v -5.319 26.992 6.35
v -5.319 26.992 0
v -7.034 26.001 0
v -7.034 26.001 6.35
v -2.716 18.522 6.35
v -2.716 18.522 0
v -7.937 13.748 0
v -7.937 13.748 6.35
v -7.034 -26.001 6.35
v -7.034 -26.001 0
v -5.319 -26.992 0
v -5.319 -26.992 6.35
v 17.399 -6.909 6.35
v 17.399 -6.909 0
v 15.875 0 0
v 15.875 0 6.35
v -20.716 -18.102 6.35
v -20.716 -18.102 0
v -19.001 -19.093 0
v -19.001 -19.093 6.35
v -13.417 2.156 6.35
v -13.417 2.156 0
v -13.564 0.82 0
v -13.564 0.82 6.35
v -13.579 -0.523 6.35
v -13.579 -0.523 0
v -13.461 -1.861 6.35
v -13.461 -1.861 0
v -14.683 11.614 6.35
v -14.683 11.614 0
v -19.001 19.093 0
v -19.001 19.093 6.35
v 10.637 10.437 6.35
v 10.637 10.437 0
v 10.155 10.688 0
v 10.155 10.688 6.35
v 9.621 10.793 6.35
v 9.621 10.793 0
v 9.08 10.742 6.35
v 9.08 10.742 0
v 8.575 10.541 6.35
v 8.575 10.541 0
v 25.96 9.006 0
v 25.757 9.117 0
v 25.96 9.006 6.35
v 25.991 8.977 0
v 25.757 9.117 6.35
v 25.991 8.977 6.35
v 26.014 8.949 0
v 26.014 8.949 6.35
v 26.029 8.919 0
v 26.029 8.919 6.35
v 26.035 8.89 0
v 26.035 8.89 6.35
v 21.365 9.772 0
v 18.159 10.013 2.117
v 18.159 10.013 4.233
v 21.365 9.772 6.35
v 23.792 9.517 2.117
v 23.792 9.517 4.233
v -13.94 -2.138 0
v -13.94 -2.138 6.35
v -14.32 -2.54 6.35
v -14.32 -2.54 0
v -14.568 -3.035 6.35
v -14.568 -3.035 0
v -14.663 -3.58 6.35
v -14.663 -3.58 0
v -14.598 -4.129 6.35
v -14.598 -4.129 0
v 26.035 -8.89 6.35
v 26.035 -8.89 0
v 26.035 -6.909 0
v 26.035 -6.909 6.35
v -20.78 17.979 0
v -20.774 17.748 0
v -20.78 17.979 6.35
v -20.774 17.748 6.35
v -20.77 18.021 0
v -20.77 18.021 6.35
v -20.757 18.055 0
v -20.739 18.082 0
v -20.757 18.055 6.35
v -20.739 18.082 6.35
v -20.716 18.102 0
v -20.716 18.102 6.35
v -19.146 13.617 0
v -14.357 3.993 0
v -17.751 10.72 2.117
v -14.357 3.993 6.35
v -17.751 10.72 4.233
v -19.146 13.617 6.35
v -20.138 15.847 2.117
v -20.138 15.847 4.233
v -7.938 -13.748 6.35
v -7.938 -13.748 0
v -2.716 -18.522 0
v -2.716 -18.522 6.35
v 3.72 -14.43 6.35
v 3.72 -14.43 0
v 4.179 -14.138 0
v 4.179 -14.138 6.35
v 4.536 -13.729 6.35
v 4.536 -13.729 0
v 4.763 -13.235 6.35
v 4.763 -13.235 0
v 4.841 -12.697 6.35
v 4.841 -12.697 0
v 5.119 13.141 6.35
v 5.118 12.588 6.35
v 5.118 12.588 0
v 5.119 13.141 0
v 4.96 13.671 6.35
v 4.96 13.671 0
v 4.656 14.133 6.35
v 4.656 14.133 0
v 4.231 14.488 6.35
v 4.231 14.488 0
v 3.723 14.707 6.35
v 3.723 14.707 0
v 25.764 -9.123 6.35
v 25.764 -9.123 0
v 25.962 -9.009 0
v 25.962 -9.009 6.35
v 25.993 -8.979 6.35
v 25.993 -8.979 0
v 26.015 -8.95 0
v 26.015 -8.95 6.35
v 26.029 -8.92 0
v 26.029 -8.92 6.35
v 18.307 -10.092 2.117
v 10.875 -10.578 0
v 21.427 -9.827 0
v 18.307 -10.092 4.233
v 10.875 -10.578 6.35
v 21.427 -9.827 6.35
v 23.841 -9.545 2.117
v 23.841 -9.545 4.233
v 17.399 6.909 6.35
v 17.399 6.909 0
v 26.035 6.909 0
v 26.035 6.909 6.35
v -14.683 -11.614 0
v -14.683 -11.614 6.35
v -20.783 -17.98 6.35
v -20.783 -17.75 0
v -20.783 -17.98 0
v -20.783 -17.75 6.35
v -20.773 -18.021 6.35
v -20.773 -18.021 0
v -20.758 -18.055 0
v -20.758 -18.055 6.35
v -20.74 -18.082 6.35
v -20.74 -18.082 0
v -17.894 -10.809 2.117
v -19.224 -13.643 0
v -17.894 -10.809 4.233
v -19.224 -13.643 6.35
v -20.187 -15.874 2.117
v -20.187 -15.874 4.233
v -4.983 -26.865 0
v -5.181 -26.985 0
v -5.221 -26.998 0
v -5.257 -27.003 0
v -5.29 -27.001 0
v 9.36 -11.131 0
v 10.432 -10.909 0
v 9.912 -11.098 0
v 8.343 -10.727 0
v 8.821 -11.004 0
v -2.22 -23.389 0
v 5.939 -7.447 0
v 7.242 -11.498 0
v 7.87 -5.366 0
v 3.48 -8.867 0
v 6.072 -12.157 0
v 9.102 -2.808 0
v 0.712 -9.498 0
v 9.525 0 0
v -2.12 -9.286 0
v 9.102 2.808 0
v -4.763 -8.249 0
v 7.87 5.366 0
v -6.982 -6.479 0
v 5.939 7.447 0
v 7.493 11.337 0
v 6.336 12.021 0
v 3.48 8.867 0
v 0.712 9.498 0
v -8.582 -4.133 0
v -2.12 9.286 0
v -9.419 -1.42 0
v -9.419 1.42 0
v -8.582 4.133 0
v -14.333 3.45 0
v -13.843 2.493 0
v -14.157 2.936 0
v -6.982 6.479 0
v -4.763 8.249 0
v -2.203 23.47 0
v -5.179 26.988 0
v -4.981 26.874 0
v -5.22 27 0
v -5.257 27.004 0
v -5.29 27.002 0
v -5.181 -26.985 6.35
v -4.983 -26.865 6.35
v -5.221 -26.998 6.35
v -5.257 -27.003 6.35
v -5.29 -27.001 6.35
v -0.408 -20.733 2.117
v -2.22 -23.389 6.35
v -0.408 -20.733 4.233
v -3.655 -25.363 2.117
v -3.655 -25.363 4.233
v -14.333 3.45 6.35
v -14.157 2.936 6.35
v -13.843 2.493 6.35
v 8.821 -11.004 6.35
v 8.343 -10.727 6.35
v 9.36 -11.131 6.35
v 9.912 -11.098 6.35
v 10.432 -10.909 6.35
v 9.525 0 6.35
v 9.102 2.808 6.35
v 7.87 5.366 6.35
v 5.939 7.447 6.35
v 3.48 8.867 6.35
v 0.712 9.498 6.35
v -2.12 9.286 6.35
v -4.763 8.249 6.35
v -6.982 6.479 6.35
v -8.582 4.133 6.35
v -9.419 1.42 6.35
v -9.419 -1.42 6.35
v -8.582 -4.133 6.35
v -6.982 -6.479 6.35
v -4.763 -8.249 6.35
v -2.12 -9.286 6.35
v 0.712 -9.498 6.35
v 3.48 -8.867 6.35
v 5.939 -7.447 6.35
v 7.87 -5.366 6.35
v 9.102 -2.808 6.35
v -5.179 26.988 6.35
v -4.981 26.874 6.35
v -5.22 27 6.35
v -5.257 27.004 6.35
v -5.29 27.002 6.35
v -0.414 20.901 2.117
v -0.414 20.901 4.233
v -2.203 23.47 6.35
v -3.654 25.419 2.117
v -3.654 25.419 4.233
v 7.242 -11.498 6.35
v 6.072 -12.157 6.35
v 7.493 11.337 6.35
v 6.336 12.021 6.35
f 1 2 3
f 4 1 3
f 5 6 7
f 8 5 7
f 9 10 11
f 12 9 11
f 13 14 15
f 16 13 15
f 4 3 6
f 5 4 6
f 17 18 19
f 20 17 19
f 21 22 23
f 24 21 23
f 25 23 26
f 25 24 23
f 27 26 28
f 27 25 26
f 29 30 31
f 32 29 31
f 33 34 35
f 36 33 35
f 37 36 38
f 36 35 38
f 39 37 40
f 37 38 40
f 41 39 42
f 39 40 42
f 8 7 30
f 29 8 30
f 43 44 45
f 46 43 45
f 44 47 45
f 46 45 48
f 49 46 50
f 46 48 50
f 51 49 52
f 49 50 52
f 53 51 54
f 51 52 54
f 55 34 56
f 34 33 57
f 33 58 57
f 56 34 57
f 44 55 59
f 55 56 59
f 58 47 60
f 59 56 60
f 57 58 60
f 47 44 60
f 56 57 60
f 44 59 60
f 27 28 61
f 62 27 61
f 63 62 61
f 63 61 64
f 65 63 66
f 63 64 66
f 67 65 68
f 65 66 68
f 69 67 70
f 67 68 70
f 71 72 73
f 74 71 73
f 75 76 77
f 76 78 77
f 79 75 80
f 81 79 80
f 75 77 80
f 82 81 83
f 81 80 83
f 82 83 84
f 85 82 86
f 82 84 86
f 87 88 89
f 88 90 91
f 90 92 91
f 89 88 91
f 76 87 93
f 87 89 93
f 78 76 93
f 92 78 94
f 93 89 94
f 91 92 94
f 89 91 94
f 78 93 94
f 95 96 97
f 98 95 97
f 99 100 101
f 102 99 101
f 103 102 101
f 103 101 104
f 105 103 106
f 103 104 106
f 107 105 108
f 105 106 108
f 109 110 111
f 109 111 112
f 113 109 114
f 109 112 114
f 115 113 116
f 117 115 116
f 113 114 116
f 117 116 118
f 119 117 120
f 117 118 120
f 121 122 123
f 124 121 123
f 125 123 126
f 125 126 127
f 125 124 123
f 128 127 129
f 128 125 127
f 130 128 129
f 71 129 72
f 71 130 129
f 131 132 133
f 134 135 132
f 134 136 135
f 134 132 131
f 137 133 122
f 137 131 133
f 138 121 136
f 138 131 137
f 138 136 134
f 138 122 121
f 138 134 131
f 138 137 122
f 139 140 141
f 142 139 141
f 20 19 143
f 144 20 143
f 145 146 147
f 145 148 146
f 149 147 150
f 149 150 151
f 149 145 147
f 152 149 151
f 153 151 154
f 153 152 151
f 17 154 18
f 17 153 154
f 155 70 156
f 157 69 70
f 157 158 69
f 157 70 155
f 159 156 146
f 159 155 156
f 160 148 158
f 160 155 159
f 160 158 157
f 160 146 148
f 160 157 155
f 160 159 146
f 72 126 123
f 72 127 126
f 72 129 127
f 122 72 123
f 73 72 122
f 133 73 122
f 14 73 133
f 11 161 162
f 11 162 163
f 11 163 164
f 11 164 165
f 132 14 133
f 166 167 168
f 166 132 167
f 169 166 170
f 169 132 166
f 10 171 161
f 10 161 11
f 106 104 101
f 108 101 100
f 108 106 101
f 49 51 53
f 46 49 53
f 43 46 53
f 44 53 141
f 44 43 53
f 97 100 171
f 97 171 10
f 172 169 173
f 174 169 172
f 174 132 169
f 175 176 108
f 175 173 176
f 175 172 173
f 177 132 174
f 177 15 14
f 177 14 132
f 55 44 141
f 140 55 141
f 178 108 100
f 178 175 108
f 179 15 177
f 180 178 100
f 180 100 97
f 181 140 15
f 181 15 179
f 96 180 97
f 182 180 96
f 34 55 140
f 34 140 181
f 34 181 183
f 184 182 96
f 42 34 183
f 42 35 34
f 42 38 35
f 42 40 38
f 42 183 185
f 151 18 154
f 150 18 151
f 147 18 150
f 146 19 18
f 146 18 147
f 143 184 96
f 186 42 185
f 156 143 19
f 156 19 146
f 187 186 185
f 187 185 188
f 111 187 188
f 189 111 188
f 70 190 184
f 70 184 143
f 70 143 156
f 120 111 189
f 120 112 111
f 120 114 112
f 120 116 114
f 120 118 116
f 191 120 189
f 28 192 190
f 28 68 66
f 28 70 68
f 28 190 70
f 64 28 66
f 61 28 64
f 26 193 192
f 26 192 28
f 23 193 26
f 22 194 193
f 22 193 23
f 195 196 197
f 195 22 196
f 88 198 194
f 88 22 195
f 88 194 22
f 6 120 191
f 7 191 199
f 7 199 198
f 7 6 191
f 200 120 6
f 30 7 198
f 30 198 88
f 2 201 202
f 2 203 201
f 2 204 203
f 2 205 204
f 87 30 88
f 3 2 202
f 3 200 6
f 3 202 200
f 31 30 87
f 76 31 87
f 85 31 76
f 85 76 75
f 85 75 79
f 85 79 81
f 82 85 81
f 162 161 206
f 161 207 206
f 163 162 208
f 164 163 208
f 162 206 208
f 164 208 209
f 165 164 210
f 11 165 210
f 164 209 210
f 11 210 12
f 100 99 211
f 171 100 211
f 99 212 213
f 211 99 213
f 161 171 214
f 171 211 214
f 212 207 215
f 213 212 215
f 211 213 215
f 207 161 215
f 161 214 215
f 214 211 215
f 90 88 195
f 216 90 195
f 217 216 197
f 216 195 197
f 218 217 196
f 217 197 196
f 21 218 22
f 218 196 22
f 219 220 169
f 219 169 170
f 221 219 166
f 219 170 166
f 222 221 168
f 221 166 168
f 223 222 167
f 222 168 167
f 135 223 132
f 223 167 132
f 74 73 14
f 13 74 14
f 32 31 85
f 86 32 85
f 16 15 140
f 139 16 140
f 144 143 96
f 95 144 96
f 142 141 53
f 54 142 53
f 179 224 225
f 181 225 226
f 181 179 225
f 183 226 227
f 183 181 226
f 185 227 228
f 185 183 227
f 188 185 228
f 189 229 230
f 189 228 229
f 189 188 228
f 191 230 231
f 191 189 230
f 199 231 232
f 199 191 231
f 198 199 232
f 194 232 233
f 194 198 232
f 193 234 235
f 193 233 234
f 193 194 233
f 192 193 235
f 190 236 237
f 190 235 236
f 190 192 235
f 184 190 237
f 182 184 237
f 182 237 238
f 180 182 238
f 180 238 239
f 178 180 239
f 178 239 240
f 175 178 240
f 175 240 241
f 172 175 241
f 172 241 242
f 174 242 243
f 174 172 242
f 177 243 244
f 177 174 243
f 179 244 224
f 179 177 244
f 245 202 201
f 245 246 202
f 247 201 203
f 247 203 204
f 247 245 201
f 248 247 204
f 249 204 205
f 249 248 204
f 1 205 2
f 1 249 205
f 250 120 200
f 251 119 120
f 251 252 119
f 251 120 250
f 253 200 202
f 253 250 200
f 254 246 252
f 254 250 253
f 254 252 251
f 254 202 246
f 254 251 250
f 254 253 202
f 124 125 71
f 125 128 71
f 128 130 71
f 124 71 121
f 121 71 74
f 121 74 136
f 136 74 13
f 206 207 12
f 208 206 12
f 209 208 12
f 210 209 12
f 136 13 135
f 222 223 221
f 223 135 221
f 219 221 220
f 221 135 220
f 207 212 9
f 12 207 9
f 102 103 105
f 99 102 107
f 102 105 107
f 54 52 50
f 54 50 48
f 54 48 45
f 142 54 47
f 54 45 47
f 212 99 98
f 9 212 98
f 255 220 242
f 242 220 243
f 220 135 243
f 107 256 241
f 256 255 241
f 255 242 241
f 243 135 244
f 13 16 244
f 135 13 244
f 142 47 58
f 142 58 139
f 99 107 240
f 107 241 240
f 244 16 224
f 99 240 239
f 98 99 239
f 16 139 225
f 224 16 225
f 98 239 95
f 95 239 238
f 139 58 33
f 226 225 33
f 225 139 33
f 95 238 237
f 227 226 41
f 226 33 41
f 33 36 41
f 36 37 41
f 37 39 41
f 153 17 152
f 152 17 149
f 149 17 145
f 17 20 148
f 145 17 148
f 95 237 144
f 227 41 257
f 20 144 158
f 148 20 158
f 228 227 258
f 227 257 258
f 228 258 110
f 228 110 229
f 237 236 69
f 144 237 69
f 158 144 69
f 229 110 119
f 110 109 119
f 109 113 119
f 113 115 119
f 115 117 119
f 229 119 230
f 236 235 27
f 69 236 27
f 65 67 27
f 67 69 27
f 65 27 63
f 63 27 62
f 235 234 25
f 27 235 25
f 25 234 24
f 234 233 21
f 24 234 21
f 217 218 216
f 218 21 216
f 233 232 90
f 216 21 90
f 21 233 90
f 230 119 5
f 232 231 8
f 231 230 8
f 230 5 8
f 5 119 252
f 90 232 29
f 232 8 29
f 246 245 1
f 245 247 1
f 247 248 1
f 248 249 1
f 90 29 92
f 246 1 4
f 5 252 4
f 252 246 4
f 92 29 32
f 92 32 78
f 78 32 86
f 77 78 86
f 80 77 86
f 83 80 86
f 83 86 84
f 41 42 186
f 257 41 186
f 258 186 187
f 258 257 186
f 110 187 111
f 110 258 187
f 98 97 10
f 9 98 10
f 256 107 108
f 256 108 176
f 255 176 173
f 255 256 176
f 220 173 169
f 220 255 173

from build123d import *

# Parameters (mm, degrees)
F0_R     = 9.525
F1_DEPTH = 6.35
F3_COUNT = 3
F4_R     = 9.525
F5_DEPTH = 6.35
F7_DEPTH = 6.35


with BuildPart() as f1:
    # F0 (on Top) → F1 (new body)
    with BuildSketch(Plane.XY):
        with BuildLine():
            Line((9.525, 0), (12.7, 0))
            ThreePointArc((12.7, 0), (12.1234798492, 3.7830194747), (10.4462619928, 7.2225764363))
            ThreePointArc((10.4462619928, 7.2225764363), (10.00070112, 7.0453500483), (9.525, 6.985))
            Line((9.525, 6.985), (9.525, 0))
        make_face()
        with BuildLine():
            ThreePointArc((9.525, -8.4002604126), (9.9057858228, -7.9476667791), (10.2650859452, -7.4778346155))
            ThreePointArc((10.2650859452, -7.4778346155), (9.9025309799, -7.3659812593), (9.525, -7.3281971973))
            Line((9.525, -7.3281971973), (9.525, -8.4002604126))
        make_face()
        with BuildLine():
            ThreePointArc((11.3988304843, -8.89), (11.0104940402, -8.040581393), (10.2650859452, -7.4778346155))
            ThreePointArc((10.2650859452, -7.4778346155), (9.9057858228, -7.9476667791), (9.525, -8.4002604126))
            Line((9.525, -8.4002604126), (9.525, -8.89))
            Line((9.525, -8.89), (11.3988304843, -8.89))
        make_face()
        with BuildLine():
            ThreePointArc((7.7935067776, -10.0275247248), (8.6973942383, -9.2544764013), (9.525, -8.4002604126))
            Line((9.525, -8.4002604126), (9.525, -7.3281971973))
            ThreePointArc((9.525, -7.3281971973), (7.921532049, -8.2046469895), (7.7935067776, -10.0275247248))
        make_face()
        with BuildLine():
            Line((9.525, 6.985), (9.525, 8.4002604126))
            ThreePointArc((9.525, 8.4002604126), (8.7581956911, 9.196956466), (7.9249969146, 9.9239318772))
            ThreePointArc((7.9249969146, 9.9239318772), (7.8518793788, 7.9791254823), (9.525, 6.985))
        make_face()
        with BuildLine():
            ThreePointArc((10.4462619928, 7.2225764363), (12.1234798492, 3.7830194747), (12.7, 0))
            Line((12.7, 0), (15.875, 0))
            Line((15.875, 0), (17.399, 6.9088))
            Line((17.399, 6.9088), (26.035, 6.9088))
            Line((26.035, 6.9088), (26.035, 8.89))
            Line((26.035, 8.89), (11.43, 8.89))
            ThreePointArc((11.43, 8.89), (11.1657359776, 7.922006998), (10.4462619928, 7.2225764363))
        make_face()
        with BuildLine():
            ThreePointArc((9.525, 6.985), (10.00070112, 7.0453500483), (10.4462619928, 7.2225764363))
            ThreePointArc((10.4462619928, 7.2225764363), (10.0029776208, 7.8249880969), (9.525, 8.4002604126))
            Line((9.525, 8.4002604126), (9.525, 6.985))
        make_face()
        with BuildLine():
            ThreePointArc((9.525, 8.4002604126), (10.0029776208, 7.8249880969), (10.4462619928, 7.2225764363))
            ThreePointArc((10.4462619928, 7.2225764363), (11.1657359776, 7.922006998), (11.43, 8.89))
            Line((11.43, 8.89), (9.525, 8.89))
            Line((9.525, 8.89), (9.525, 8.4002604126))
        make_face()
        with BuildLine():
            Line((9.525, -8.89), (9.525, -8.4002604126))
            ThreePointArc((9.525, -8.4002604126), (8.6973942383, -9.2544764013), (7.7935067776, -10.0275247248))
            ThreePointArc((7.7935067776, -10.0275247248), (9.9315282348, -11.0943150857), (11.43, -9.2331971973))
            ThreePointArc((11.43, -9.2331971973), (11.4221916182, -9.0608923403), (11.3988304843, -8.89))
            Line((11.3988304843, -8.89), (9.525, -8.89))
        make_face()
        with BuildLine():
            ThreePointArc((7.9249969146, 9.9239318772), (8.7581956911, 9.196956466), (9.525, 8.4002604126))
            Line((9.525, 8.4002604126), (9.525, 8.89))
            Line((9.525, 8.89), (11.43, 8.89))
            ThreePointArc((11.43, 8.89), (10.0639893887, 10.7171604852), (7.9249969146, 9.9239318772))
        make_face()
        with BuildLine():
            Line((15.875, 0), (12.7, 0))
            ThreePointArc((12.7, 0), (12.075938711, -3.9321373638), (10.2650859452, -7.4778346155))
            ThreePointArc((10.2650859452, -7.4778346155), (11.0104940402, -8.040581393), (11.3988304843, -8.89))
            Line((11.3988304843, -8.89), (26.035, -8.89))
            Line((26.035, -8.89), (26.035, -6.9088))
            Line((26.035, -6.9088), (17.399, -6.9088))
            Line((17.399, -6.9088), (15.875, 0))
        make_face()
        with BuildLine():
            ThreePointArc((10.2650859452, -7.4778346155), (12.075938711, -3.9321373638), (12.7, 0))
            Line((12.7, 0), (9.525, 0))
            Line((9.525, 0), (9.525, -7.3281971973))
            ThreePointArc((9.525, -7.3281971973), (9.9025309799, -7.3659812593), (10.2650859452, -7.4778346155))
        make_face()
        with BuildLine():
            Line((9.525, -7.3281971973), (9.525, 0))
            Line((9.525, 0), (9.525, 6.985))
            ThreePointArc((9.525, 6.985), (7.8518793788, 7.9791254823), (7.9249969146, 9.9239318772))
            ThreePointArc((7.9249969146, 9.9239318772), (-12.6997241984, 0.0836975719), (7.7935067776, -10.0275247248))
            ThreePointArc((7.7935067776, -10.0275247248), (7.921532049, -8.2046469895), (9.525, -7.3281971973))
        make_face()
        Circle(F0_R, mode=Mode.SUBTRACT)
    extrude(amount=F1_DEPTH)


with BuildPart() as f3_1:
    # F3: instance of F1
    add(f1.part.rotate(Axis((0, 0, 3.175), (0, 0, 1)), 1 * 360 / F3_COUNT))


with BuildPart() as f3_2:
    # F3: instance of F1
    add(f1.part.rotate(Axis((0, 0, 3.175), (0, 0, 1)), 2 * 360 / F3_COUNT))


with BuildPart() as f1_1:
    add(f1.part)

    add(f3_1.part)  # F5 merges F3_1

    add(f3_2.part)  # F5 merges F3_2
    # F4 (on face) → F5 (join)
    with BuildSketch(Plane.XY.offset(6.35)):
        with BuildLine():
            ThreePointArc((4.8414628101, -12.6972894296), (11.1904325012, -7.7094190078), (13.589, 0))
            ThreePointArc((13.589, 0), (-0.9329227135, 13.5569383052), (-13.4609045126, -1.8614431777))
            ThreePointArc((-13.4609045126, -1.8614431777), (-13.0283174584, -1.7464719499), (-12.5808445376, -1.7356124916))
            ThreePointArc((-12.5808445376, -1.7356124916), (6.4223463228, 10.9564349909), (4.6318786538, -11.8252145916))
            ThreePointArc((4.6318786538, -11.8252145916), (4.7887256176, -12.2487417548), (4.8414628101, -12.6972894296))
        make_face()
        with BuildLine():
            ThreePointArc((-12.5808445376, -1.7356124916), (-13.0283174584, -1.7464719499), (-13.4609045126, -1.8614431777))
            ThreePointArc((-13.4609045126, -1.8614431777), (-6.9229751419, -11.6933030486), (4.8414628101, -12.6972894296))
            ThreePointArc((4.8414628101, -12.6972894296), (4.7887256176, -12.2487417548), (4.6318786538, -11.8252145916))
            ThreePointArc((4.6318786538, -11.8252145916), (6.4223463228, 10.9564349909), (-12.5808445376, -1.7356124916))
        make_face()
        Circle(F4_R, mode=Mode.SUBTRACT)
    extrude(amount=-F5_DEPTH)

    # F6 (on face) → F7 (join)
    with BuildSketch(Plane.XY.offset(6.35)):
        with BuildLine():
            add(Edge.make_bspline(
                [(10.6367632499, 10.4369348649), (18.6027915748, 10.0299773304), (25.9883071623, 9.6007507753), (26.035, 8.89)],
                knots=[0.0462368838, 0.0462368838, 0.0462368838, 0.0462368838, 0.584525149, 0.584525149, 0.584525149, 0.584525149], degree=3))
            ThreePointArc((10.6367632499, 10.4369348649), (11.2201303771, 9.7592283961), (11.43, 8.89))
            Line((11.43, 8.89), (26.035, 8.89))
        make_face()
        with BuildLine():
            ThreePointArc((1.9995505975, 14.3166767728), (2.8133537712, 14.7235401011), (3.7230379132, 14.7065655527))
            add(Edge.make_bspline(
                [(3.7230379132, 14.7065655527), (-0.6351401044, 21.3148502374), (-4.6685883244, 27.3160665919), (-5.3185341604, 26.9919713875)],
                knots=[0.0562643988, 0.0562643988, 0.0562643988, 0.0562643988, 0.5862434824, 0.5862434824, 0.5862434824, 0.5862434824], degree=3))
            Line((-5.3185341604, 26.9919713875), (1.9995505975, 14.3166767728))
        make_face()
        with BuildLine():
            add(Edge.make_bspline(
                [(10.8747404145, -10.5775281884), (18.7767718356, -10.1073776533), (25.9907017622, -9.6149172072), (26.035, -8.89)],
                knots=[0.0562643988, 0.0562643988, 0.0562643988, 0.0562643988, 0.5862434824, 0.5862434824, 0.5862434824, 0.5862434824], degree=3))
            Line((26.035, -8.89), (11.3988304843, -8.89))
            ThreePointArc((11.3988304843, -8.89), (11.3442828756, -9.7982058862), (10.8747404145, -10.5775281884))
        make_face()
        with BuildLine():
            Line((-13.4139658396, 5.4536703653), (-20.7164658396, 18.1019713875))
            add(Edge.make_bspline(
                [(-14.3570323556, 3.993239756), (-17.987610955, 11.0955014199), (-21.3086476479, 17.7061588163), (-20.7164658396, 18.1019713875)],
                knots=[0.0462368838, 0.0462368838, 0.0462368838, 0.0462368838, 0.584525149, 0.584525149, 0.584525149, 0.584525149], degree=3))
            ThreePointArc((-14.3570323556, 3.993239756), (-14.0618049009, 4.8373037423), (-13.4139658396, 5.4536703653))
        make_face()
        with BuildLine():
            add(Edge.make_bspline(
                [(3.7202691057, -14.4301746209), (-0.6151806199, -21.1254787503), (-4.6796595144, -27.3069095915), (-5.3185341604, -26.9919713875)],
                knots=[0.0462368838, 0.0462368838, 0.0462368838, 0.0462368838, 0.584525149, 0.584525149, 0.584525149, 0.584525149], degree=3))
            ThreePointArc((3.7202691057, -14.4301746209), (2.8416745238, -14.5965321384), (1.9839658396, -14.3436703653))
            Line((1.9839658396, -14.3436703653), (-5.3185341604, -26.9919713875))
        make_face()
        with BuildLine():
            ThreePointArc((-13.3983810818, -5.4266767728), (-14.1576366468, -4.9253342149), (-14.5977783276, -4.1290373643))
            add(Edge.make_bspline(
                [(-14.5977783276, -4.1290373643), (-18.1416317312, -11.207472584), (-21.3221134379, -17.7011493846), (-20.7164658396, -18.1019713875)],
                knots=[0.0562643988, 0.0562643988, 0.0562643988, 0.0562643988, 0.5862434824, 0.5862434824, 0.5862434824, 0.5862434824], degree=3))
            Line((-20.7164658396, -18.1019713875), (-13.3983810818, -5.4266767728))
        make_face()
    extrude(amount=-F7_DEPTH)


solid = f1_1.part
